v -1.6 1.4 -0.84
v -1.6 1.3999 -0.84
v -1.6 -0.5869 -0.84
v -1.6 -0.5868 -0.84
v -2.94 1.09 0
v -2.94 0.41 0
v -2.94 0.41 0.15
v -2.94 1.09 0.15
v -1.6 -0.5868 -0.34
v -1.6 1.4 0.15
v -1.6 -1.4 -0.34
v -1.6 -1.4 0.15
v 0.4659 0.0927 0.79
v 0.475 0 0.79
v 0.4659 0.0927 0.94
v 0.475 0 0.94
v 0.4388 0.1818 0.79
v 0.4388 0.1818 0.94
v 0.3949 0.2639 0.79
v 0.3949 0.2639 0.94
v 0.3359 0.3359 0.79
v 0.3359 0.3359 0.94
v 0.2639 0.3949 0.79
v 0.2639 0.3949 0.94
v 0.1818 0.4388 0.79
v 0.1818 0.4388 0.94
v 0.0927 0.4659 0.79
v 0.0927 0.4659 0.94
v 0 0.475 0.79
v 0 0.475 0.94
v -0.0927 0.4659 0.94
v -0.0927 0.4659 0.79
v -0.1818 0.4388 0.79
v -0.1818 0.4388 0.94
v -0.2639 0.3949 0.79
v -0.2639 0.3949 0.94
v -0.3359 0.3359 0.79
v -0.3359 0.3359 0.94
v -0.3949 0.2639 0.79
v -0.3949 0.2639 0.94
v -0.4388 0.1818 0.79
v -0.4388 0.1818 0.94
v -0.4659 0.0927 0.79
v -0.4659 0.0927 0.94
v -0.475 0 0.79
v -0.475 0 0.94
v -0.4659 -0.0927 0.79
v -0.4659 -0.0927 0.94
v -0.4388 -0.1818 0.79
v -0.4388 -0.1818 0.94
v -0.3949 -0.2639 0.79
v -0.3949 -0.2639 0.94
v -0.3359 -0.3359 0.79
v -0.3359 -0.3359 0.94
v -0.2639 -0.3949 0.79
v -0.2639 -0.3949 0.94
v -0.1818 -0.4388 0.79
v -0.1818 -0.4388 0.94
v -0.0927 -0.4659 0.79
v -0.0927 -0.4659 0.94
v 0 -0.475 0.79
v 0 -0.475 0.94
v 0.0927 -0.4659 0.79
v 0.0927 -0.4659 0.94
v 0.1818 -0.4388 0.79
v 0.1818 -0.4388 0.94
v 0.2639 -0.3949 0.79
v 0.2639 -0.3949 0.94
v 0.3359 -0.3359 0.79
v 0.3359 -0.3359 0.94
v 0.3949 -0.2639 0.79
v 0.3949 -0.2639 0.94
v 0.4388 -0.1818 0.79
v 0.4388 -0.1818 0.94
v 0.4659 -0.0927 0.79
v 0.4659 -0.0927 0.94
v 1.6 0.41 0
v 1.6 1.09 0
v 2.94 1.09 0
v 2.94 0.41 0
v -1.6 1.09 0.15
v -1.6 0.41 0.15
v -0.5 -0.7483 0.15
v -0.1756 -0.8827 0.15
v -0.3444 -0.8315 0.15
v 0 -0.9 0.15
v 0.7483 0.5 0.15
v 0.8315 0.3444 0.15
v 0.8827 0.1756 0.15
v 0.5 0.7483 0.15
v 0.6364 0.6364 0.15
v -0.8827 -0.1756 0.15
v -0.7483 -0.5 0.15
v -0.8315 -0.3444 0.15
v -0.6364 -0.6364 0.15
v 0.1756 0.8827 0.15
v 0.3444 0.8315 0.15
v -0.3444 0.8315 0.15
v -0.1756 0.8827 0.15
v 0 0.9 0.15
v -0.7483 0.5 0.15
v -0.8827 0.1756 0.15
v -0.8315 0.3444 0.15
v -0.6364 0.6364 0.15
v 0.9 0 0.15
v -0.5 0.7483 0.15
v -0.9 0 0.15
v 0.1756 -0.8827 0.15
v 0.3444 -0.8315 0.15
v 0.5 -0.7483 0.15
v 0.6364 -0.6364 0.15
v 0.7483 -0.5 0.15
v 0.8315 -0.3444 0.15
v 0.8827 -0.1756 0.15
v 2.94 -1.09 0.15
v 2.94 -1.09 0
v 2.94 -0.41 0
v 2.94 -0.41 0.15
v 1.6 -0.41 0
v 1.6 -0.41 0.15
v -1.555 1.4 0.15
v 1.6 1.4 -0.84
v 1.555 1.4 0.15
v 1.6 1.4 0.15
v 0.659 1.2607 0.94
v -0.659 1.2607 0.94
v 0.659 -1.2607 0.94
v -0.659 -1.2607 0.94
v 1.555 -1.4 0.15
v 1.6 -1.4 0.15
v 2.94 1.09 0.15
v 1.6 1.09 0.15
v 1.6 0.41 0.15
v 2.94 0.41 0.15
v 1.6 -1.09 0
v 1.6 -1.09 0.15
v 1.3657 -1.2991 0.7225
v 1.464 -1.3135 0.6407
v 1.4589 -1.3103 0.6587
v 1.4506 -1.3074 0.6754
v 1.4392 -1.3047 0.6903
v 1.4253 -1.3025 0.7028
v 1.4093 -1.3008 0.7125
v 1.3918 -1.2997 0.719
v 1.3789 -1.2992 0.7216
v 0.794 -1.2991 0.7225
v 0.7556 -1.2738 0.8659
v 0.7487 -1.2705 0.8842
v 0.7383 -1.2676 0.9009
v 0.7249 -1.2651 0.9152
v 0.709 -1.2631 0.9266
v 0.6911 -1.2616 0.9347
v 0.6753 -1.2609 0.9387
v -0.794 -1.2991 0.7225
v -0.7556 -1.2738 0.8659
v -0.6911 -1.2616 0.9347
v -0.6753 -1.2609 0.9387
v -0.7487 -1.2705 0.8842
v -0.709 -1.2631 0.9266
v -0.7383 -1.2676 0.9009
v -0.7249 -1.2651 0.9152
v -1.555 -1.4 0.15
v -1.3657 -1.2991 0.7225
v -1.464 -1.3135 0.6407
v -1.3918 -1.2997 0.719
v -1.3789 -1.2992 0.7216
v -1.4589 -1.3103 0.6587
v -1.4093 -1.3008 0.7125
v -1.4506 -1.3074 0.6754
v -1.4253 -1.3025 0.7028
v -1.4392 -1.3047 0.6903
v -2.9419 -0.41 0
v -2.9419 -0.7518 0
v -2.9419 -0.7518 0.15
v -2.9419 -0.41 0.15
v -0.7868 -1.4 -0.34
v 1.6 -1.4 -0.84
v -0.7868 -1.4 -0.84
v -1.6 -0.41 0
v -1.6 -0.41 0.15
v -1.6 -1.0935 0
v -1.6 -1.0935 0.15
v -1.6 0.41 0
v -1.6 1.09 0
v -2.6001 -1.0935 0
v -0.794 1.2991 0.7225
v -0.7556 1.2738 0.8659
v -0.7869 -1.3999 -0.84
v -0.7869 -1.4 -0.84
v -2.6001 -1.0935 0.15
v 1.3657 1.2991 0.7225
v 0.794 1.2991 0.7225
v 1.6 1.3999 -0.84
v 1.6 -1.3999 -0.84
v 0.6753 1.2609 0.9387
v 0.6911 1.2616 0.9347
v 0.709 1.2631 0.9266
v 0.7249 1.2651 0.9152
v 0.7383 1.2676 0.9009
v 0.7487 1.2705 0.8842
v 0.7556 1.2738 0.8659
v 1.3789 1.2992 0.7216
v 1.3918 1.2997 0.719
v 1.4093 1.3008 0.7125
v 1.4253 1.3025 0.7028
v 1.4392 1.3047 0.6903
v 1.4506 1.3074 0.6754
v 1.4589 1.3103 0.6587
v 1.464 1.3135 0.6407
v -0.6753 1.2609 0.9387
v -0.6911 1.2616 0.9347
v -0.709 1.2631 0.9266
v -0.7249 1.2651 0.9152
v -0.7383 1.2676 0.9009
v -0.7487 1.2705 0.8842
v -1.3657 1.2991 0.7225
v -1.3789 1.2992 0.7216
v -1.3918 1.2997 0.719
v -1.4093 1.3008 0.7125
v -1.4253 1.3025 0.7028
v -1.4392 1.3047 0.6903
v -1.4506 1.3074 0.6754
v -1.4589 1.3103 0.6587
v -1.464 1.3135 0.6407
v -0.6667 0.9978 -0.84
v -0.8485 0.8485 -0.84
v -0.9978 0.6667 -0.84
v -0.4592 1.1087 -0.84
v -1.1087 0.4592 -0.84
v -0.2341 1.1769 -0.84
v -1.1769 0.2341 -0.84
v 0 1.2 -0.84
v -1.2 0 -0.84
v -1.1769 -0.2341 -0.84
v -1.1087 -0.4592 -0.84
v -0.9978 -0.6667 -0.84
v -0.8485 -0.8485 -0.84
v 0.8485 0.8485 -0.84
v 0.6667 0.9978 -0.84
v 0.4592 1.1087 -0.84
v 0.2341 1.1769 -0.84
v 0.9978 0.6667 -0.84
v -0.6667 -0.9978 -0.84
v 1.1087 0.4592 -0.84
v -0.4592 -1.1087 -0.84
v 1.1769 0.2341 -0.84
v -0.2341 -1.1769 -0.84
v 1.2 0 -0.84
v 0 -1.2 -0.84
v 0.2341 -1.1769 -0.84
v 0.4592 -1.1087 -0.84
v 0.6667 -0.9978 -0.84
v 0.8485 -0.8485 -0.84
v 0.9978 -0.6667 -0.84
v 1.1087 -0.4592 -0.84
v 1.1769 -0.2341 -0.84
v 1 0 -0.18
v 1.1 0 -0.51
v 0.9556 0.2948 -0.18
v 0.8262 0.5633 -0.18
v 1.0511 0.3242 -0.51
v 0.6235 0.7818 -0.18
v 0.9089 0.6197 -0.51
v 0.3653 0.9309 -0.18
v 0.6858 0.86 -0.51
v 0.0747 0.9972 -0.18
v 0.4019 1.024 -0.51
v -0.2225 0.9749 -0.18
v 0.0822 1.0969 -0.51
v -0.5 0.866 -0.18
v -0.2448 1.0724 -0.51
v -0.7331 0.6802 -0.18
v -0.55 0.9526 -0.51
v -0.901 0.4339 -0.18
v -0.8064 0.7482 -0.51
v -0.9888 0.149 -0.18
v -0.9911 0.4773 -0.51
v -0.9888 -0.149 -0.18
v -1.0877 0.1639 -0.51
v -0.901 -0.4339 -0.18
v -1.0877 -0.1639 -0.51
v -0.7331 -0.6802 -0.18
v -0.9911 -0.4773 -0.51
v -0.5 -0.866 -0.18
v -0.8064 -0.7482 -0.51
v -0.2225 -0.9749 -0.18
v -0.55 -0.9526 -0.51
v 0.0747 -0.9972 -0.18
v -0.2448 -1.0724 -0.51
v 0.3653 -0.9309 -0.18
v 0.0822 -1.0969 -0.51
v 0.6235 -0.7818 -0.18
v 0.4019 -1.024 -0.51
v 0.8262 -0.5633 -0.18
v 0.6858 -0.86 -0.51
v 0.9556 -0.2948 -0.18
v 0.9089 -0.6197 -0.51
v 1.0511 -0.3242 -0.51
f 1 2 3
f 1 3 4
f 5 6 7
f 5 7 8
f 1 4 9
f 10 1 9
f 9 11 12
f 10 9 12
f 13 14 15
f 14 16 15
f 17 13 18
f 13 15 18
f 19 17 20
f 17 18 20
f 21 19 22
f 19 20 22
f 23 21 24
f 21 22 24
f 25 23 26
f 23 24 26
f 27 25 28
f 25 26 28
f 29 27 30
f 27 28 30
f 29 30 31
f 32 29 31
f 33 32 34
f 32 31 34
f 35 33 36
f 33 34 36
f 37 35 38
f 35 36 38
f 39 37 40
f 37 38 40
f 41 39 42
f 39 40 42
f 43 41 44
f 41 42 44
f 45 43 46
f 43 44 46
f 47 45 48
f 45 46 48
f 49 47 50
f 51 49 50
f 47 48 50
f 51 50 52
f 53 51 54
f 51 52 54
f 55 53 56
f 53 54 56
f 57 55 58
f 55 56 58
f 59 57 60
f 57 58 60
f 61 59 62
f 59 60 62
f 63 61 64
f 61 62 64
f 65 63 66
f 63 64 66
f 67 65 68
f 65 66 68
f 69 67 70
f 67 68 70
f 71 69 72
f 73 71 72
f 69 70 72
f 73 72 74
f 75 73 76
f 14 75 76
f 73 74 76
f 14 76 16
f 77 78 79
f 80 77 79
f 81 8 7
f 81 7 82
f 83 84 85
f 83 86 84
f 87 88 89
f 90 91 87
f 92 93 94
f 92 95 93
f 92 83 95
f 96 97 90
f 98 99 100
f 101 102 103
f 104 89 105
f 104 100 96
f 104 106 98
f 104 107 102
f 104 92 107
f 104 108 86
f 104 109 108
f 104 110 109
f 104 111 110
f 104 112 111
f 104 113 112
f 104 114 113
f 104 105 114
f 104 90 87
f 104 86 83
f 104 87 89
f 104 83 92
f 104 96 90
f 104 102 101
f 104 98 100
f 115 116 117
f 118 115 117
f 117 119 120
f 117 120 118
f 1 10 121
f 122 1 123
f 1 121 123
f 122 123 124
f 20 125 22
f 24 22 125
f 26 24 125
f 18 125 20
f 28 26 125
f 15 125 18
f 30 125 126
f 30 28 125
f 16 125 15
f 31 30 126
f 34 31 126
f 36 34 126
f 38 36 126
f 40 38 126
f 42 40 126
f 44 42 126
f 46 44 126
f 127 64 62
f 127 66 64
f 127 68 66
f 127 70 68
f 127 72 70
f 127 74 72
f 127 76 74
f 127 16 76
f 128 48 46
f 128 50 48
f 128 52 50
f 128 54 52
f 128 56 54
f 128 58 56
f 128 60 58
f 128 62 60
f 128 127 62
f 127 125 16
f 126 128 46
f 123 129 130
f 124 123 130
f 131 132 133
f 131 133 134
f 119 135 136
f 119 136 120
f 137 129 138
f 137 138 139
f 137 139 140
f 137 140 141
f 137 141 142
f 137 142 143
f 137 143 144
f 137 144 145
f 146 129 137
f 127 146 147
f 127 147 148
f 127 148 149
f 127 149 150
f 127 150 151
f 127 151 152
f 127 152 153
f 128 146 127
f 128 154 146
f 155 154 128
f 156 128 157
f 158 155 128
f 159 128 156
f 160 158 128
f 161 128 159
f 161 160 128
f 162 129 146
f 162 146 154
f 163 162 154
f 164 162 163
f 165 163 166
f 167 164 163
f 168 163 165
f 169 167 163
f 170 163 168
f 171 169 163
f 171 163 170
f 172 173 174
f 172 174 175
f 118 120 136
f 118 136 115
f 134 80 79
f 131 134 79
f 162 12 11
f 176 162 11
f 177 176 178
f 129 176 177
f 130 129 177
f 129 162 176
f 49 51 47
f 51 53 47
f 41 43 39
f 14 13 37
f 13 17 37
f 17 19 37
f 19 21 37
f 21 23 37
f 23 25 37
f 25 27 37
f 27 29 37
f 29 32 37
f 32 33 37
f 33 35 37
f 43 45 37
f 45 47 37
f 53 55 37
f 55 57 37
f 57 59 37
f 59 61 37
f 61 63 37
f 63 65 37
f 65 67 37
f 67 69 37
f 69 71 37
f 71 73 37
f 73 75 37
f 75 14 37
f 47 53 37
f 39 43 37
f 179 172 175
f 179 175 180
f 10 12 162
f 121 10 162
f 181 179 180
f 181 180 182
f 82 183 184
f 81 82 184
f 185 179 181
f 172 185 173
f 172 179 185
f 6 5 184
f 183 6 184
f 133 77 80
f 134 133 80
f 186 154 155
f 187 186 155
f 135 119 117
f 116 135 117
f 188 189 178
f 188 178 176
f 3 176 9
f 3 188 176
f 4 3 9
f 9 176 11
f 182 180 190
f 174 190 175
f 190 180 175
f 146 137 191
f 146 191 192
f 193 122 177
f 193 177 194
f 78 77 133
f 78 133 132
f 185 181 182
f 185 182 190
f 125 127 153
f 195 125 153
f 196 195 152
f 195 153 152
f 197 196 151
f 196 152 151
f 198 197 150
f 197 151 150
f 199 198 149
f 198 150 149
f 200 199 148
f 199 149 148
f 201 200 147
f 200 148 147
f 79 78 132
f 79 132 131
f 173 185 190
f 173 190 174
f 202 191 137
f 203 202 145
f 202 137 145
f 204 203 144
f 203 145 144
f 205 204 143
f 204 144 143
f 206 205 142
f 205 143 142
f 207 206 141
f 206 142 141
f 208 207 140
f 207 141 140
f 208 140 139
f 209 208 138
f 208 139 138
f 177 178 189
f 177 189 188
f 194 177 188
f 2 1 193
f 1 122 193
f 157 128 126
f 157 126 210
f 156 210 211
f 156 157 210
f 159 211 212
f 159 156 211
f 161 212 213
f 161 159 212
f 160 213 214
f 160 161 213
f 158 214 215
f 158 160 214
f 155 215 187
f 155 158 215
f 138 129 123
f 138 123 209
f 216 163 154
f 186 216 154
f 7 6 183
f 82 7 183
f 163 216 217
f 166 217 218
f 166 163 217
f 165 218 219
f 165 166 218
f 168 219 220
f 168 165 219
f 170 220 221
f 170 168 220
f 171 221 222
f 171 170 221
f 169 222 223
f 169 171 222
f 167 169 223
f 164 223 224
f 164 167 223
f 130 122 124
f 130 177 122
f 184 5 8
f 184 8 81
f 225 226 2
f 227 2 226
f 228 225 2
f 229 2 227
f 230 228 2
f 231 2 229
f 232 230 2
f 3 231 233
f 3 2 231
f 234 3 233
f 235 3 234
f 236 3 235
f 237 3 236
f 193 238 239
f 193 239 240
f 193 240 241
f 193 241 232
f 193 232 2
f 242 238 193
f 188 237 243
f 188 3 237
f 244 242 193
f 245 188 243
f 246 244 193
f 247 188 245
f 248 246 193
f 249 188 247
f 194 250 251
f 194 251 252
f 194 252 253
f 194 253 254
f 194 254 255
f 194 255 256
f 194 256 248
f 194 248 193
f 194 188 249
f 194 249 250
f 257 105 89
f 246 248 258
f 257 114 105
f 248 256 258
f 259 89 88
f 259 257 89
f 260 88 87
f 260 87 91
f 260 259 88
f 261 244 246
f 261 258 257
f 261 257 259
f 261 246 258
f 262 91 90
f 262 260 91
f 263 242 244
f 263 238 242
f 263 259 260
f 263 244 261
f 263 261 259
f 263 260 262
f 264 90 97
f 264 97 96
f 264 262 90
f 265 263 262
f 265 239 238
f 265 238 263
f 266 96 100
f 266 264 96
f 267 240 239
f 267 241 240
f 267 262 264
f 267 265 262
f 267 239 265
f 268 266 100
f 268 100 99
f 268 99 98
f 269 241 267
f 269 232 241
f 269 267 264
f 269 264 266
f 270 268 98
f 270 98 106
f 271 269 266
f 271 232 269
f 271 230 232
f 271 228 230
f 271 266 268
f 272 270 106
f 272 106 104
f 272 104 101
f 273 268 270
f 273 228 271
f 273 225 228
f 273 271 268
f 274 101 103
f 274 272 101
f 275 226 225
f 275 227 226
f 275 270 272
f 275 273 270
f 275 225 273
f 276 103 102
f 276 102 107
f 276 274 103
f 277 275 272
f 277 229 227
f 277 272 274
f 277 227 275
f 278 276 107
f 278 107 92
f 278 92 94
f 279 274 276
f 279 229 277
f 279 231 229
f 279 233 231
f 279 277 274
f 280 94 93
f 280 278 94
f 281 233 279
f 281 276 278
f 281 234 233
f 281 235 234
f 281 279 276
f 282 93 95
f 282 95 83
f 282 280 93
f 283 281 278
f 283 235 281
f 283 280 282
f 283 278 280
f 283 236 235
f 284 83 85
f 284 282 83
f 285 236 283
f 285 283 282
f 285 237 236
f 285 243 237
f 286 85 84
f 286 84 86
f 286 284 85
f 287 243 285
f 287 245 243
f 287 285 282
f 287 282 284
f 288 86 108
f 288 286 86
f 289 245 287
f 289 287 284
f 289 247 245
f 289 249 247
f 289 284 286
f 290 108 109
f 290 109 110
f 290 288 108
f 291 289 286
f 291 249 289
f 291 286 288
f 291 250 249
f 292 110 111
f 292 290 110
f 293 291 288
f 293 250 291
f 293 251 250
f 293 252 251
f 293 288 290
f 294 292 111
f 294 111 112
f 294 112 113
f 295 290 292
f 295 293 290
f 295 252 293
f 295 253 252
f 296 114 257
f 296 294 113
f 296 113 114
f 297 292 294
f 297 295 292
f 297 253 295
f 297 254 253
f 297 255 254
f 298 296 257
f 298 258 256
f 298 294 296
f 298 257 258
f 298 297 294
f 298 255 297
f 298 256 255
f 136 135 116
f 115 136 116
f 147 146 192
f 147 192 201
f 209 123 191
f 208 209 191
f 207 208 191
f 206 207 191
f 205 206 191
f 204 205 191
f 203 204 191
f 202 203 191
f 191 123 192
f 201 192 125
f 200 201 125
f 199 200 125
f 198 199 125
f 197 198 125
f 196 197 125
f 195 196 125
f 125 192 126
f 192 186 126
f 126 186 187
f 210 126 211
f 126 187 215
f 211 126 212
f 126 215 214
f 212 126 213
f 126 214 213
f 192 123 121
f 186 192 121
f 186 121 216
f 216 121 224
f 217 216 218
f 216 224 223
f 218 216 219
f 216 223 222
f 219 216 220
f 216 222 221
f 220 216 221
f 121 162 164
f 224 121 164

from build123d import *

# Parameters (mm, degrees)
SKETCH_W             = 3.2
SKETCH_H             = 0.99
PAD_DEPTH            = 1.4
PAD001_DEPTH         = 1.4
POCKET_DEPTH         = 1.601
POCKET_DEPTH_BACK    = 1.601
POCKET001_DEPTH      = 1.601
POCKET001_DEPTH_BACK = 1.601
SKETCH007_W          = 0.475
SKETCH007_H          = 0.15
POCKET003_DEPTH      = 0.5
FILLET_R             = 5e-05
SKETCH009_W          = 1.34
SKETCH009_H          = 0.68
PAD002_DEPTH         = 0.15
PAD003_DEPTH         = 0.15
MIRROREDSKETCH002_W  = 1.34
MIRROREDSKETCH002_H  = 0.68
PAD004_DEPTH         = 0.15
MIRROREDSKETCH003_W  = 1.34
MIRROREDSKETCH003_H  = 0.68
PAD005_DEPTH         = 0.15


with BuildPart() as body:
    # Sketch → Pad (new body, symmetric)
    with BuildSketch(Plane.XZ):
        with Locations((0, -0.345)):
            Rectangle(SKETCH_W, SKETCH_H)
    extrude(amount=PAD_DEPTH, both=True)

    # Sketch002 → Pad001 (join, symmetric)
    with BuildSketch(Plane.XZ):
        with BuildLine():
            Line((-1.555, 0.15), (-1.46405, 0.640724))
            ThreePointArc((-1.365724, 0.7225), (-1.429668, 0.699384), (-1.46405, 0.640724))
            Line((-1.365724, 0.7225), (-0.794, 0.7225))
            Line((-0.794, 0.7225), (-0.755581, 0.865882))
            ThreePointArc((-0.658988, 0.94), (-0.719864, 0.919335), (-0.755581, 0.865882))
            Line((-0.658988, 0.94), (0, 0.94))
            Line((0, 0.94), (0, 0.15))
            Line((0, 0.15), (-1.555, 0.15))
        make_face()
    pad001 = extrude(amount=PAD001_DEPTH, both=True)

    # Mirrored: Pad001 across Sketch002 V_Axis
    add(pad001.mirror(Plane(origin=(0, 0, 0), x_dir=(0, -1, 0), z_dir=(1, 0, 0))))

    # Sketch003 → Pocket (cut, two sides)
    with BuildSketch(Plane.YZ) as pocket_sk:
        Polygon((-1.4, 0.15), (-1.260702, 0.94), (-1.4, 0.94), align=None)
    extrude(amount=-POCKET_DEPTH, mode=Mode.SUBTRACT)
    extrude(pocket_sk.sketch, amount=POCKET_DEPTH_BACK, mode=Mode.SUBTRACT)

    # MirroredSketch → Pocket001 (cut, two sides)
    with BuildSketch(Plane.YZ) as pocket001_sk:
        Polygon((1.4, 0.15), (1.260702, 0.94), (1.4, 0.94), align=None)
    extrude(amount=-POCKET001_DEPTH, mode=Mode.SUBTRACT)
    extrude(pocket001_sk.sketch, amount=POCKET001_DEPTH_BACK, mode=Mode.SUBTRACT)

    # Sketch006 → Groove (revolve, cut)
    with BuildSketch(Plane.XZ):
        Polygon((0, 0.15), (0.9, 0.15), (1.2, -0.84), (0, -0.84), align=None)
    revolve(axis=Axis((0, 0, 0), (0, 0, 1)), mode=Mode.SUBTRACT)

    # Sketch007 → Groove001 (revolve, cut)
    with BuildSketch(Plane.XZ):
        with Locations((0.2375, 0.865)):
            Rectangle(SKETCH007_W, SKETCH007_H)
    revolve(axis=Axis((0, 0, 0), (0, 0, 1)), mode=Mode.SUBTRACT)

    # Sketch008 (on Face3 of Groove001) → Pocket003 (cut)
    with BuildSketch(Plane(origin=(0, 0, -0.84), x_dir=(1, 0, 0), z_dir=(0, 0, -1))):
        Polygon((-1.6, 1.4), (-0.786827, 1.4), (-1.6, 0.586827), align=None)
    extrude(amount=-POCKET003_DEPTH, mode=Mode.SUBTRACT)

    # Fillet
    fillet_edges = [body.edges().sort_by_distance(p)[0] for p in [
        (0.406586, -1.4, -0.84),
        (1.6, 0, -0.84),
        (0, 1.4, -0.84),
        (-1.6, 0.406586, -0.84),
    ]]
    fillet(fillet_edges, radius=FILLET_R)


with BuildPart() as pin1:
    # Sketch009 → Pad002 (new body)
    with BuildSketch(Plane.XY):
        with Locations((-2.27, 0.75)):
            Rectangle(SKETCH009_W, SKETCH009_H)
    extrude(amount=PAD002_DEPTH)


with BuildPart() as pin2:
    # MirroredSketch001 → Pad003 (new body)
    with BuildSketch(Plane.XY):
        Polygon((-2.941863, -0.751761), (-2.941863, -0.41), (-1.6, -0.41), (-1.6, -1.093521), (-2.600102, -1.093521), align=None)
    extrude(amount=PAD003_DEPTH)


with BuildPart() as pin3:
    # MirroredSketch002 → Pad004 (new body)
    with BuildSketch(Plane.XY):
        with Locations((2.27, 0.75)):
            Rectangle(MIRROREDSKETCH002_W, MIRROREDSKETCH002_H)
    extrude(amount=PAD004_DEPTH)


with BuildPart() as pin4:
    # MirroredSketch003 → Pad005 (new body)
    with BuildSketch(Plane.XY):
        with Locations((2.27, -0.75)):
            Rectangle(MIRROREDSKETCH003_W, MIRROREDSKETCH003_H)
    extrude(amount=PAD005_DEPTH)


solid = Compound([body.part, pin1.part, pin2.part, pin3.part, pin4.part])
